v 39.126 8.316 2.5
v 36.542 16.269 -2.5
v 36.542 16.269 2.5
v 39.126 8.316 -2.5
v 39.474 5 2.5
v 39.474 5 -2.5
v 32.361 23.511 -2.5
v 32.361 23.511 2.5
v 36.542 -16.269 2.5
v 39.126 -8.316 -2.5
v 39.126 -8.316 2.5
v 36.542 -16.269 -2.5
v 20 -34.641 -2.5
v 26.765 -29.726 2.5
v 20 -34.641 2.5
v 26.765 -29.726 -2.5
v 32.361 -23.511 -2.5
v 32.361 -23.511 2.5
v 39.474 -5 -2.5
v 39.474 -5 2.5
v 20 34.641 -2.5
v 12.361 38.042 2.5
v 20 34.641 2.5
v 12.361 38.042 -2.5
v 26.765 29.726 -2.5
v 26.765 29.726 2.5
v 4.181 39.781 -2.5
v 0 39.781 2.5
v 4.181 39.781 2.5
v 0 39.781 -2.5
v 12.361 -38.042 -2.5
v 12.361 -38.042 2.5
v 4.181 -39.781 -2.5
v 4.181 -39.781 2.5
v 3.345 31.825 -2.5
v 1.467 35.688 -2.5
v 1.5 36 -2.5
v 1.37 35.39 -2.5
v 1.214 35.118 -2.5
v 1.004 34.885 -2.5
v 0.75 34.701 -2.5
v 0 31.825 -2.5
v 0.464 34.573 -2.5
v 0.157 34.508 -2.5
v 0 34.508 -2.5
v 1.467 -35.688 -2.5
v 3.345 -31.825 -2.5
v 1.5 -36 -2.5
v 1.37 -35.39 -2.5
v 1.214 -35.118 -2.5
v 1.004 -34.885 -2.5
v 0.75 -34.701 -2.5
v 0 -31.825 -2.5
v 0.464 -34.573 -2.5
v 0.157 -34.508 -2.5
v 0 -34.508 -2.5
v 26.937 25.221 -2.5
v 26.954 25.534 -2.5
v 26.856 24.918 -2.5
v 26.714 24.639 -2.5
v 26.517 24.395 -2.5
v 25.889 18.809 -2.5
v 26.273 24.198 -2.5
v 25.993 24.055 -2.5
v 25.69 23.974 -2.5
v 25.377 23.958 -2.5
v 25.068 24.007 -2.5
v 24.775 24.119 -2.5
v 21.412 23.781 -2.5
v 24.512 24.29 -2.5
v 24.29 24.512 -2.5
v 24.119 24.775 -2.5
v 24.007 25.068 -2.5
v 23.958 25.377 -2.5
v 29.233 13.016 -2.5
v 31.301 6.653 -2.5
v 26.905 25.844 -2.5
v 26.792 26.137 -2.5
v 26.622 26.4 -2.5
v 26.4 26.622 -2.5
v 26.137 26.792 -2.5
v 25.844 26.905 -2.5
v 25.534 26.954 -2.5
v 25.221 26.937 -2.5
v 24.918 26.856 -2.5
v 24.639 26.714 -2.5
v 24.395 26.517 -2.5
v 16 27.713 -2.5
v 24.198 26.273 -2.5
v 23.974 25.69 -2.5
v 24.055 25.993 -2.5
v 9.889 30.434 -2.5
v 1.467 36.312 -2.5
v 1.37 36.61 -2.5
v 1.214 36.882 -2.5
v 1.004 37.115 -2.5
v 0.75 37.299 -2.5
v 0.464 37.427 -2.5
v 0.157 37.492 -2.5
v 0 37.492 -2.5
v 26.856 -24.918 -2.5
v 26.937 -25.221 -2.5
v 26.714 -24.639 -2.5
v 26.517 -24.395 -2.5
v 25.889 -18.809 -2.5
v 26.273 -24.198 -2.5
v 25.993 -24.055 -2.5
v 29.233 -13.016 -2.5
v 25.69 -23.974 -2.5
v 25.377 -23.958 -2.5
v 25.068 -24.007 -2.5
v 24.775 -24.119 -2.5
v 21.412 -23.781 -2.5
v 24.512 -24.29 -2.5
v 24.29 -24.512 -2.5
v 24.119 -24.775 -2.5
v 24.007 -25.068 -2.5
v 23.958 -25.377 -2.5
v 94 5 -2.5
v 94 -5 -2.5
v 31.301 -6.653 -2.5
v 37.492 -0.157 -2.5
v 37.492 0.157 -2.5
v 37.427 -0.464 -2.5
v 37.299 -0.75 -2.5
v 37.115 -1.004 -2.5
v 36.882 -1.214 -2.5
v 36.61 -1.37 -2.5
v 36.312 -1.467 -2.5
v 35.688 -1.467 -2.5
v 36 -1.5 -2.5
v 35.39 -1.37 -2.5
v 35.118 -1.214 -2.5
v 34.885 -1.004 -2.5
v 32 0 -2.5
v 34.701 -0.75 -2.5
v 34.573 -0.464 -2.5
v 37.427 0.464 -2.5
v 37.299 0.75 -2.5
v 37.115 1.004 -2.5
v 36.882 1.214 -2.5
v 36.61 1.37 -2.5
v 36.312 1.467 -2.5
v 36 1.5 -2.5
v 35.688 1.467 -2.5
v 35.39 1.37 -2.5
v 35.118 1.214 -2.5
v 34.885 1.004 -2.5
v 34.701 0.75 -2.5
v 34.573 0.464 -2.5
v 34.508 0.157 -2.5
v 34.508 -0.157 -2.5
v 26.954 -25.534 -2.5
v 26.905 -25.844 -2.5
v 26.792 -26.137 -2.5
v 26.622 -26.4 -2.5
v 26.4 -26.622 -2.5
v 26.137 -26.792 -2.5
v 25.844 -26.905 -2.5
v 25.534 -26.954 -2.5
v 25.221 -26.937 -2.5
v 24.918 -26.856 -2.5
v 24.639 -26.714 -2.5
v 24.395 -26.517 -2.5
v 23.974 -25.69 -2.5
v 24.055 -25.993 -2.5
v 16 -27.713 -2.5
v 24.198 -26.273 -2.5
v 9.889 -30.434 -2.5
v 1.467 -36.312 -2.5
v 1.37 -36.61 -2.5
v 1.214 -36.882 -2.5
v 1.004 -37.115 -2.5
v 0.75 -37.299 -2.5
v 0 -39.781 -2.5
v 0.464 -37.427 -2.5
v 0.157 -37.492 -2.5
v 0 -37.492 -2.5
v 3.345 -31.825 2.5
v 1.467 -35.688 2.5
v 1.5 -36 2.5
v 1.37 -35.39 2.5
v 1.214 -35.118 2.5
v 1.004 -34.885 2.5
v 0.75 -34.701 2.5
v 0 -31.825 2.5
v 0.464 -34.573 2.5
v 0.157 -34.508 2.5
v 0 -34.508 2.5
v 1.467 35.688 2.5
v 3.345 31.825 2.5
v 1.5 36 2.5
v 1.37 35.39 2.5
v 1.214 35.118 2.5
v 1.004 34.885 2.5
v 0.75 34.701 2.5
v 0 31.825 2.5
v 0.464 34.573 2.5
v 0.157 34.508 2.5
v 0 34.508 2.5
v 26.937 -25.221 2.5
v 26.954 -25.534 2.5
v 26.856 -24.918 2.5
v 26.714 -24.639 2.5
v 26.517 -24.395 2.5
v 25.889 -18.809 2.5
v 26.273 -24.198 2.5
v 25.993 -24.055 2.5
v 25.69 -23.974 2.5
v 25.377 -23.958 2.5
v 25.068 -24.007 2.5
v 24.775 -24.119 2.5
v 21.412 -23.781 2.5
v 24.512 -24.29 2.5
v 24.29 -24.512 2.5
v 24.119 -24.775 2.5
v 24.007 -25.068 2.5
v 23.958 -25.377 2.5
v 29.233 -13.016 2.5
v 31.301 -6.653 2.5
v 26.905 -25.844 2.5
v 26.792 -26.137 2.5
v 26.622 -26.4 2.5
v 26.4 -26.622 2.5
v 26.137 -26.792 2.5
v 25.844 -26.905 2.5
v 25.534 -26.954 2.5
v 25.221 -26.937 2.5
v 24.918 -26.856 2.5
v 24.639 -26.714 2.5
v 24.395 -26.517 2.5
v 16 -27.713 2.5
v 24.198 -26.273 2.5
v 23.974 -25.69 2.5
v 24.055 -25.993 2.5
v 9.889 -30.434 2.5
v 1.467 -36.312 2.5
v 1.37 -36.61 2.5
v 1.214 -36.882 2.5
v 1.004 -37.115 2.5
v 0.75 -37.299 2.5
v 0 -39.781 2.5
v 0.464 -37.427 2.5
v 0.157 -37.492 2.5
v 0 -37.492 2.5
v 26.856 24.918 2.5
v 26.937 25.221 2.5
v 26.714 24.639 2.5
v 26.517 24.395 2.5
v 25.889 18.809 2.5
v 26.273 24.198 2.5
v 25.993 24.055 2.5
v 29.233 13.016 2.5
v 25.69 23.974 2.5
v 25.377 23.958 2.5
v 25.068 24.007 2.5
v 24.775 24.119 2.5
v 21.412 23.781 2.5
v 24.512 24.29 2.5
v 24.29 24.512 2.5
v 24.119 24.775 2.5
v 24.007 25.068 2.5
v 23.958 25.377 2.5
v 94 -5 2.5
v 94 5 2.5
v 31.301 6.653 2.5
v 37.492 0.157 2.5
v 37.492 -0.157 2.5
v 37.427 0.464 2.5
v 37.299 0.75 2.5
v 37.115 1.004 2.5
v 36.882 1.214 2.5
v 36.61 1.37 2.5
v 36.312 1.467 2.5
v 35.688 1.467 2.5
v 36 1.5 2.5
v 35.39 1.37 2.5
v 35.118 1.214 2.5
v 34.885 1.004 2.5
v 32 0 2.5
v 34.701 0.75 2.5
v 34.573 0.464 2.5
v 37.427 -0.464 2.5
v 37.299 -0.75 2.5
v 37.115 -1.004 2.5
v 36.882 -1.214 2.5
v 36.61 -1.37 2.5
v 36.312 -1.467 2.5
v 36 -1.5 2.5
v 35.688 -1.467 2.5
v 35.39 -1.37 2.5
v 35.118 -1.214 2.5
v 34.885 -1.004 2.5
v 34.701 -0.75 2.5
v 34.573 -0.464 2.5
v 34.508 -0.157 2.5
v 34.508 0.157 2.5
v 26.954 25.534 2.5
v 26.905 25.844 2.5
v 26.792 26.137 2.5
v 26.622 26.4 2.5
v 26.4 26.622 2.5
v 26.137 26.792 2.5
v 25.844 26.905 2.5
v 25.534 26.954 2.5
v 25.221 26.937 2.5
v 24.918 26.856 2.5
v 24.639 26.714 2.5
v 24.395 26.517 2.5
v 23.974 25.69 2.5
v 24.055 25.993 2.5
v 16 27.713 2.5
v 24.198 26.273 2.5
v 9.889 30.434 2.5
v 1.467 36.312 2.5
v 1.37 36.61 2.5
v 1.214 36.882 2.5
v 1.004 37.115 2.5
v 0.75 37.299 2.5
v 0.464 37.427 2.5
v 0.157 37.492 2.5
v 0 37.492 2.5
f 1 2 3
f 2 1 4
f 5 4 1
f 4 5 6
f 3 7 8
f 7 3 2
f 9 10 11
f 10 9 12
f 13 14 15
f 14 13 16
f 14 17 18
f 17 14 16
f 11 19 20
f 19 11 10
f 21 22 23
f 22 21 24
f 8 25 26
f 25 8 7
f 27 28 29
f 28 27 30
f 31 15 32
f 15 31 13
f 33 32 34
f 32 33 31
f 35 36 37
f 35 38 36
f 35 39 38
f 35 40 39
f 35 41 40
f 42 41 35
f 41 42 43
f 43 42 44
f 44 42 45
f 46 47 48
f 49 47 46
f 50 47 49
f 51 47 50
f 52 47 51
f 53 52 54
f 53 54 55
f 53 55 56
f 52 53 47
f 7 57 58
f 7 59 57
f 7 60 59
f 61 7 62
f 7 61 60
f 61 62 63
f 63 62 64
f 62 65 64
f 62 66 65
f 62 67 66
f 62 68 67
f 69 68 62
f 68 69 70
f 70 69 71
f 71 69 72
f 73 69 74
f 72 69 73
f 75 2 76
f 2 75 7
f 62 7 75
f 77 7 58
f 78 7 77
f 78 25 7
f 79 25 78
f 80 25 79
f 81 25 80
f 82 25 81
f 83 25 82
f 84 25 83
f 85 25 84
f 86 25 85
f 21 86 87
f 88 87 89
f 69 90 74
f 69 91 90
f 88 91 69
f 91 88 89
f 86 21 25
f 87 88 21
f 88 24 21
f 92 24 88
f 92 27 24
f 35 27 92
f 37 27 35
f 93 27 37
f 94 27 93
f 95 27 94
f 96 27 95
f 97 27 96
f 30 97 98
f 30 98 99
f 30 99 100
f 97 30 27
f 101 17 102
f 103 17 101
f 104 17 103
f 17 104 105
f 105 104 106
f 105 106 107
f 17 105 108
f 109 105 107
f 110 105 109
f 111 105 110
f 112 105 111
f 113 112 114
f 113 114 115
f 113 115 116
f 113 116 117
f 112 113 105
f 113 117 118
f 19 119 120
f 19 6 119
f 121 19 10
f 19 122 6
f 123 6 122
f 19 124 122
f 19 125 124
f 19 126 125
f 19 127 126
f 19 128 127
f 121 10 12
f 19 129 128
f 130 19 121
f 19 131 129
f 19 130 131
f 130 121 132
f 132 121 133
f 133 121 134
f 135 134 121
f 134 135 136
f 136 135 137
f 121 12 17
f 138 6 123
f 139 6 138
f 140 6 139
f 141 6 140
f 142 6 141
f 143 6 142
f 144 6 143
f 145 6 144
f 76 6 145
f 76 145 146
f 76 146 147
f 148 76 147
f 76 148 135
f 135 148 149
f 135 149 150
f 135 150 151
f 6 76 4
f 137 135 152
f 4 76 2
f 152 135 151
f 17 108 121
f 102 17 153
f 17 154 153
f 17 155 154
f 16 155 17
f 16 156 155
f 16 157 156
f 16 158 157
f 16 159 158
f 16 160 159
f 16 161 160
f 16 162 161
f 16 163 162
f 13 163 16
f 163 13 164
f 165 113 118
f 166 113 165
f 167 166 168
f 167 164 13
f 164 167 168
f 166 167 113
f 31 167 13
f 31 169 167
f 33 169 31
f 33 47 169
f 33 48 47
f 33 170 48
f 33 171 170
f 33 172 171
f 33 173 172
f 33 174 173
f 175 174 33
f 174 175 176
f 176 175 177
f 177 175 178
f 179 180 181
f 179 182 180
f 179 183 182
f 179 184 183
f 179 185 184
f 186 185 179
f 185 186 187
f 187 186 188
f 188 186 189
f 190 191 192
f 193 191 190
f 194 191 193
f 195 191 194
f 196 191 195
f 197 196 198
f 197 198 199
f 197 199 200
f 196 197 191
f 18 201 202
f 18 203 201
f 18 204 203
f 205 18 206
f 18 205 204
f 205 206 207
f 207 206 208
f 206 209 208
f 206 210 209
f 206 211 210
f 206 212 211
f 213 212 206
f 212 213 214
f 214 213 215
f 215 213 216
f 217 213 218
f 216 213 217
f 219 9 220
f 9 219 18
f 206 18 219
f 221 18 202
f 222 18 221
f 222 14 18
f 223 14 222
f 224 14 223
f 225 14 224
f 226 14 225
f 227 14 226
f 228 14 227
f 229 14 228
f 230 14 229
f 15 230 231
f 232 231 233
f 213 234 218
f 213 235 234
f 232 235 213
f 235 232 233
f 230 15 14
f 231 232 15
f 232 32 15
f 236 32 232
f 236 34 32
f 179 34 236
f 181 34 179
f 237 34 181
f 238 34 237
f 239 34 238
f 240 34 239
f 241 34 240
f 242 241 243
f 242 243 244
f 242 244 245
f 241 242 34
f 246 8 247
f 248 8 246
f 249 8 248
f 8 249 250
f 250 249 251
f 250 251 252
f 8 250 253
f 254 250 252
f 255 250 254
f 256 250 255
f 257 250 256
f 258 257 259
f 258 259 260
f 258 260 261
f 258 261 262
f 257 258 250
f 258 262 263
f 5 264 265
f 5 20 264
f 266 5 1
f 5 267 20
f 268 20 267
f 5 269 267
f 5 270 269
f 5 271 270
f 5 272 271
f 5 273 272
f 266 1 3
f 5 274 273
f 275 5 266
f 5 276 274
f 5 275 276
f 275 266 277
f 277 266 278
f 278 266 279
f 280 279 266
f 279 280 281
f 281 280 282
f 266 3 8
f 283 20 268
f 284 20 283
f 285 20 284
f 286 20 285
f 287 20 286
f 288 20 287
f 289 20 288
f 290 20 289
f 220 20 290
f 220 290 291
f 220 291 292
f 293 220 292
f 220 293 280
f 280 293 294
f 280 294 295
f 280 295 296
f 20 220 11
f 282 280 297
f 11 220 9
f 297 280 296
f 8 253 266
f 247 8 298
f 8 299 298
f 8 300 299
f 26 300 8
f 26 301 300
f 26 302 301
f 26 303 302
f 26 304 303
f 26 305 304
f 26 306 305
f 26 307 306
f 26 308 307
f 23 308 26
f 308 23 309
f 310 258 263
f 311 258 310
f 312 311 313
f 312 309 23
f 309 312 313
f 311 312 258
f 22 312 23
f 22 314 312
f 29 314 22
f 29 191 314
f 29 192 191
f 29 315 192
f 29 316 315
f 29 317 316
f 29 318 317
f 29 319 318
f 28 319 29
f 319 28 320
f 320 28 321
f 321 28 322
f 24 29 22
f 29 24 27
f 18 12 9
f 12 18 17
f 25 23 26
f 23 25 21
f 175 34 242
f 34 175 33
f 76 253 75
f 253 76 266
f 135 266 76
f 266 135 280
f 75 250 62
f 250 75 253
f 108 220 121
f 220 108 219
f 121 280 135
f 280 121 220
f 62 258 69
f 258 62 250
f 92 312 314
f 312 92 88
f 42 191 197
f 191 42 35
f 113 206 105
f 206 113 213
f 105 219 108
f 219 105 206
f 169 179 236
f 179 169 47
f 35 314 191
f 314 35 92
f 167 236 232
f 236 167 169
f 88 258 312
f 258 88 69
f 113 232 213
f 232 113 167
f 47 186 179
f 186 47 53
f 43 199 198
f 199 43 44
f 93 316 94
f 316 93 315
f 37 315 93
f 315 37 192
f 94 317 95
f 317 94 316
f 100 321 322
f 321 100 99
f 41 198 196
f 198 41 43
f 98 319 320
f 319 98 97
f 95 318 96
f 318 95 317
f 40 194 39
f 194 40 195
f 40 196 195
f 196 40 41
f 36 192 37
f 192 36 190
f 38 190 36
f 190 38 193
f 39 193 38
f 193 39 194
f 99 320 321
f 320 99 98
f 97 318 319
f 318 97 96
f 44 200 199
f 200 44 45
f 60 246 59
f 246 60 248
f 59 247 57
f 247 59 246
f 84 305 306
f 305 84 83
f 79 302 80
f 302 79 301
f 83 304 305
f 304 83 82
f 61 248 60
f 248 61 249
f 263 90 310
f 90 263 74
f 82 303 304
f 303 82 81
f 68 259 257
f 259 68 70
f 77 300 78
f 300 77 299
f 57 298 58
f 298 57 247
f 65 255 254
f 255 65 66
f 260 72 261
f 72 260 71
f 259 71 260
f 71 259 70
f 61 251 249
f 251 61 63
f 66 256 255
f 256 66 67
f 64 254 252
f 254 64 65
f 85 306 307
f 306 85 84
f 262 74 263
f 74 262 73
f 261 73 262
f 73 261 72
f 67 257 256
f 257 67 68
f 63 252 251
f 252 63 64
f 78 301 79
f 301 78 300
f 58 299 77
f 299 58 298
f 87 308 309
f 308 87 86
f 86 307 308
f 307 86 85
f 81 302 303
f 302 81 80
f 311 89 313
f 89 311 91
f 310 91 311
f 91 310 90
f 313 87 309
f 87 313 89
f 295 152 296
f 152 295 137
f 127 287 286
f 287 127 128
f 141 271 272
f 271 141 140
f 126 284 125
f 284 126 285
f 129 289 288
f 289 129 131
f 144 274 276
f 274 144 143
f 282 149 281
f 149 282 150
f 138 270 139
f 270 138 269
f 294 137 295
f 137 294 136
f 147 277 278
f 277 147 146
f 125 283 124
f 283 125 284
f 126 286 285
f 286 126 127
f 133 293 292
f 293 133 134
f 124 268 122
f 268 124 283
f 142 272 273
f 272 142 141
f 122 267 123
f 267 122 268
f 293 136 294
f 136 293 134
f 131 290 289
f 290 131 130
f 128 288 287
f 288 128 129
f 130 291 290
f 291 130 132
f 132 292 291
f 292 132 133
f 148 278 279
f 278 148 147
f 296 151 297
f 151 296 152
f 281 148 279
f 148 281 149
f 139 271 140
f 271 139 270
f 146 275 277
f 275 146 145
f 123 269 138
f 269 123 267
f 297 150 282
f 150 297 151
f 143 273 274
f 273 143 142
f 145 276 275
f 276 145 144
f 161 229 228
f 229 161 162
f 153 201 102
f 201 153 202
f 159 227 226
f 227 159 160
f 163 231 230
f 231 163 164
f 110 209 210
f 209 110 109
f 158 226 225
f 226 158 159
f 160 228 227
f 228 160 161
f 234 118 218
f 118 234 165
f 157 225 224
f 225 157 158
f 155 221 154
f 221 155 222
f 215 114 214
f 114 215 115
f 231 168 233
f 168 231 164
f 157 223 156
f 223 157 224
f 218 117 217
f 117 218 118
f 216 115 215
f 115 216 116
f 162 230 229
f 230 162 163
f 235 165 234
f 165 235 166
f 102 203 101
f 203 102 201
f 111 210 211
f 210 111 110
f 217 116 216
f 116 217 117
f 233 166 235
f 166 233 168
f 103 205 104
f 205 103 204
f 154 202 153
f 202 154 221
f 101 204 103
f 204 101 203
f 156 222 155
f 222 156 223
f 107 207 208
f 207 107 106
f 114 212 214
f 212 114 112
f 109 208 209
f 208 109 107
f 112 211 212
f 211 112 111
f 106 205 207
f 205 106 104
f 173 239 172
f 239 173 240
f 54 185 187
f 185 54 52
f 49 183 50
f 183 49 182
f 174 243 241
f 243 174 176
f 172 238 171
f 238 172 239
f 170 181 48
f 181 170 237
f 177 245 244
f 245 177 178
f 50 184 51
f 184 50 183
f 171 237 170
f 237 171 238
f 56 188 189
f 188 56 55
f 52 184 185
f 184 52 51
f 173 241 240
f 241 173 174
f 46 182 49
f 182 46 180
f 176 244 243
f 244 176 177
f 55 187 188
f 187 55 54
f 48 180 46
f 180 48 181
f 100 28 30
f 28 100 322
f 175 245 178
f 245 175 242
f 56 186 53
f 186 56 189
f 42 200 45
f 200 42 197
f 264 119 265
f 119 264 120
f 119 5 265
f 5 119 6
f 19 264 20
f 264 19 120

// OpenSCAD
// Trichterhalterung

$fn = 30;

gabel = true;
halter = false;
if (gabel) gabel();
if (halter) halter();

module gabel() {
    difference() {
        difference(){
            cylinder(r=40,h=5, center=true);
            cylinder(r=32,h=6, center=true);
            
            // LED Lights
            translate([0,36,0])
            cylinder(d=3,h=6, center=true);
            rotate([0,0,-45]) translate([0,36,0]) 
            cylinder(d=3,h=6, center=true);
            rotate([0,0,-90]) translate([0,36,0]) 
            cylinder(d=3,h=6, center=true);
            rotate([0,0,-135]) translate([0,36,0]) 
            cylinder(d=3,h=6, center=true);
            rotate([0,0,-180]) translate([0,36,0]) 
            cylinder(d=3,h=6, center=true);
        }
        translate([-30,0,0])
        cube([60,100,10], center=true);
    }
    // Henkel
    translate([66,0,0])
    cube([56,10,5], center=true);
}


module halter() {
    union() {
        gabel();
        rotate([0,180,0]) gabel();
    }
}
